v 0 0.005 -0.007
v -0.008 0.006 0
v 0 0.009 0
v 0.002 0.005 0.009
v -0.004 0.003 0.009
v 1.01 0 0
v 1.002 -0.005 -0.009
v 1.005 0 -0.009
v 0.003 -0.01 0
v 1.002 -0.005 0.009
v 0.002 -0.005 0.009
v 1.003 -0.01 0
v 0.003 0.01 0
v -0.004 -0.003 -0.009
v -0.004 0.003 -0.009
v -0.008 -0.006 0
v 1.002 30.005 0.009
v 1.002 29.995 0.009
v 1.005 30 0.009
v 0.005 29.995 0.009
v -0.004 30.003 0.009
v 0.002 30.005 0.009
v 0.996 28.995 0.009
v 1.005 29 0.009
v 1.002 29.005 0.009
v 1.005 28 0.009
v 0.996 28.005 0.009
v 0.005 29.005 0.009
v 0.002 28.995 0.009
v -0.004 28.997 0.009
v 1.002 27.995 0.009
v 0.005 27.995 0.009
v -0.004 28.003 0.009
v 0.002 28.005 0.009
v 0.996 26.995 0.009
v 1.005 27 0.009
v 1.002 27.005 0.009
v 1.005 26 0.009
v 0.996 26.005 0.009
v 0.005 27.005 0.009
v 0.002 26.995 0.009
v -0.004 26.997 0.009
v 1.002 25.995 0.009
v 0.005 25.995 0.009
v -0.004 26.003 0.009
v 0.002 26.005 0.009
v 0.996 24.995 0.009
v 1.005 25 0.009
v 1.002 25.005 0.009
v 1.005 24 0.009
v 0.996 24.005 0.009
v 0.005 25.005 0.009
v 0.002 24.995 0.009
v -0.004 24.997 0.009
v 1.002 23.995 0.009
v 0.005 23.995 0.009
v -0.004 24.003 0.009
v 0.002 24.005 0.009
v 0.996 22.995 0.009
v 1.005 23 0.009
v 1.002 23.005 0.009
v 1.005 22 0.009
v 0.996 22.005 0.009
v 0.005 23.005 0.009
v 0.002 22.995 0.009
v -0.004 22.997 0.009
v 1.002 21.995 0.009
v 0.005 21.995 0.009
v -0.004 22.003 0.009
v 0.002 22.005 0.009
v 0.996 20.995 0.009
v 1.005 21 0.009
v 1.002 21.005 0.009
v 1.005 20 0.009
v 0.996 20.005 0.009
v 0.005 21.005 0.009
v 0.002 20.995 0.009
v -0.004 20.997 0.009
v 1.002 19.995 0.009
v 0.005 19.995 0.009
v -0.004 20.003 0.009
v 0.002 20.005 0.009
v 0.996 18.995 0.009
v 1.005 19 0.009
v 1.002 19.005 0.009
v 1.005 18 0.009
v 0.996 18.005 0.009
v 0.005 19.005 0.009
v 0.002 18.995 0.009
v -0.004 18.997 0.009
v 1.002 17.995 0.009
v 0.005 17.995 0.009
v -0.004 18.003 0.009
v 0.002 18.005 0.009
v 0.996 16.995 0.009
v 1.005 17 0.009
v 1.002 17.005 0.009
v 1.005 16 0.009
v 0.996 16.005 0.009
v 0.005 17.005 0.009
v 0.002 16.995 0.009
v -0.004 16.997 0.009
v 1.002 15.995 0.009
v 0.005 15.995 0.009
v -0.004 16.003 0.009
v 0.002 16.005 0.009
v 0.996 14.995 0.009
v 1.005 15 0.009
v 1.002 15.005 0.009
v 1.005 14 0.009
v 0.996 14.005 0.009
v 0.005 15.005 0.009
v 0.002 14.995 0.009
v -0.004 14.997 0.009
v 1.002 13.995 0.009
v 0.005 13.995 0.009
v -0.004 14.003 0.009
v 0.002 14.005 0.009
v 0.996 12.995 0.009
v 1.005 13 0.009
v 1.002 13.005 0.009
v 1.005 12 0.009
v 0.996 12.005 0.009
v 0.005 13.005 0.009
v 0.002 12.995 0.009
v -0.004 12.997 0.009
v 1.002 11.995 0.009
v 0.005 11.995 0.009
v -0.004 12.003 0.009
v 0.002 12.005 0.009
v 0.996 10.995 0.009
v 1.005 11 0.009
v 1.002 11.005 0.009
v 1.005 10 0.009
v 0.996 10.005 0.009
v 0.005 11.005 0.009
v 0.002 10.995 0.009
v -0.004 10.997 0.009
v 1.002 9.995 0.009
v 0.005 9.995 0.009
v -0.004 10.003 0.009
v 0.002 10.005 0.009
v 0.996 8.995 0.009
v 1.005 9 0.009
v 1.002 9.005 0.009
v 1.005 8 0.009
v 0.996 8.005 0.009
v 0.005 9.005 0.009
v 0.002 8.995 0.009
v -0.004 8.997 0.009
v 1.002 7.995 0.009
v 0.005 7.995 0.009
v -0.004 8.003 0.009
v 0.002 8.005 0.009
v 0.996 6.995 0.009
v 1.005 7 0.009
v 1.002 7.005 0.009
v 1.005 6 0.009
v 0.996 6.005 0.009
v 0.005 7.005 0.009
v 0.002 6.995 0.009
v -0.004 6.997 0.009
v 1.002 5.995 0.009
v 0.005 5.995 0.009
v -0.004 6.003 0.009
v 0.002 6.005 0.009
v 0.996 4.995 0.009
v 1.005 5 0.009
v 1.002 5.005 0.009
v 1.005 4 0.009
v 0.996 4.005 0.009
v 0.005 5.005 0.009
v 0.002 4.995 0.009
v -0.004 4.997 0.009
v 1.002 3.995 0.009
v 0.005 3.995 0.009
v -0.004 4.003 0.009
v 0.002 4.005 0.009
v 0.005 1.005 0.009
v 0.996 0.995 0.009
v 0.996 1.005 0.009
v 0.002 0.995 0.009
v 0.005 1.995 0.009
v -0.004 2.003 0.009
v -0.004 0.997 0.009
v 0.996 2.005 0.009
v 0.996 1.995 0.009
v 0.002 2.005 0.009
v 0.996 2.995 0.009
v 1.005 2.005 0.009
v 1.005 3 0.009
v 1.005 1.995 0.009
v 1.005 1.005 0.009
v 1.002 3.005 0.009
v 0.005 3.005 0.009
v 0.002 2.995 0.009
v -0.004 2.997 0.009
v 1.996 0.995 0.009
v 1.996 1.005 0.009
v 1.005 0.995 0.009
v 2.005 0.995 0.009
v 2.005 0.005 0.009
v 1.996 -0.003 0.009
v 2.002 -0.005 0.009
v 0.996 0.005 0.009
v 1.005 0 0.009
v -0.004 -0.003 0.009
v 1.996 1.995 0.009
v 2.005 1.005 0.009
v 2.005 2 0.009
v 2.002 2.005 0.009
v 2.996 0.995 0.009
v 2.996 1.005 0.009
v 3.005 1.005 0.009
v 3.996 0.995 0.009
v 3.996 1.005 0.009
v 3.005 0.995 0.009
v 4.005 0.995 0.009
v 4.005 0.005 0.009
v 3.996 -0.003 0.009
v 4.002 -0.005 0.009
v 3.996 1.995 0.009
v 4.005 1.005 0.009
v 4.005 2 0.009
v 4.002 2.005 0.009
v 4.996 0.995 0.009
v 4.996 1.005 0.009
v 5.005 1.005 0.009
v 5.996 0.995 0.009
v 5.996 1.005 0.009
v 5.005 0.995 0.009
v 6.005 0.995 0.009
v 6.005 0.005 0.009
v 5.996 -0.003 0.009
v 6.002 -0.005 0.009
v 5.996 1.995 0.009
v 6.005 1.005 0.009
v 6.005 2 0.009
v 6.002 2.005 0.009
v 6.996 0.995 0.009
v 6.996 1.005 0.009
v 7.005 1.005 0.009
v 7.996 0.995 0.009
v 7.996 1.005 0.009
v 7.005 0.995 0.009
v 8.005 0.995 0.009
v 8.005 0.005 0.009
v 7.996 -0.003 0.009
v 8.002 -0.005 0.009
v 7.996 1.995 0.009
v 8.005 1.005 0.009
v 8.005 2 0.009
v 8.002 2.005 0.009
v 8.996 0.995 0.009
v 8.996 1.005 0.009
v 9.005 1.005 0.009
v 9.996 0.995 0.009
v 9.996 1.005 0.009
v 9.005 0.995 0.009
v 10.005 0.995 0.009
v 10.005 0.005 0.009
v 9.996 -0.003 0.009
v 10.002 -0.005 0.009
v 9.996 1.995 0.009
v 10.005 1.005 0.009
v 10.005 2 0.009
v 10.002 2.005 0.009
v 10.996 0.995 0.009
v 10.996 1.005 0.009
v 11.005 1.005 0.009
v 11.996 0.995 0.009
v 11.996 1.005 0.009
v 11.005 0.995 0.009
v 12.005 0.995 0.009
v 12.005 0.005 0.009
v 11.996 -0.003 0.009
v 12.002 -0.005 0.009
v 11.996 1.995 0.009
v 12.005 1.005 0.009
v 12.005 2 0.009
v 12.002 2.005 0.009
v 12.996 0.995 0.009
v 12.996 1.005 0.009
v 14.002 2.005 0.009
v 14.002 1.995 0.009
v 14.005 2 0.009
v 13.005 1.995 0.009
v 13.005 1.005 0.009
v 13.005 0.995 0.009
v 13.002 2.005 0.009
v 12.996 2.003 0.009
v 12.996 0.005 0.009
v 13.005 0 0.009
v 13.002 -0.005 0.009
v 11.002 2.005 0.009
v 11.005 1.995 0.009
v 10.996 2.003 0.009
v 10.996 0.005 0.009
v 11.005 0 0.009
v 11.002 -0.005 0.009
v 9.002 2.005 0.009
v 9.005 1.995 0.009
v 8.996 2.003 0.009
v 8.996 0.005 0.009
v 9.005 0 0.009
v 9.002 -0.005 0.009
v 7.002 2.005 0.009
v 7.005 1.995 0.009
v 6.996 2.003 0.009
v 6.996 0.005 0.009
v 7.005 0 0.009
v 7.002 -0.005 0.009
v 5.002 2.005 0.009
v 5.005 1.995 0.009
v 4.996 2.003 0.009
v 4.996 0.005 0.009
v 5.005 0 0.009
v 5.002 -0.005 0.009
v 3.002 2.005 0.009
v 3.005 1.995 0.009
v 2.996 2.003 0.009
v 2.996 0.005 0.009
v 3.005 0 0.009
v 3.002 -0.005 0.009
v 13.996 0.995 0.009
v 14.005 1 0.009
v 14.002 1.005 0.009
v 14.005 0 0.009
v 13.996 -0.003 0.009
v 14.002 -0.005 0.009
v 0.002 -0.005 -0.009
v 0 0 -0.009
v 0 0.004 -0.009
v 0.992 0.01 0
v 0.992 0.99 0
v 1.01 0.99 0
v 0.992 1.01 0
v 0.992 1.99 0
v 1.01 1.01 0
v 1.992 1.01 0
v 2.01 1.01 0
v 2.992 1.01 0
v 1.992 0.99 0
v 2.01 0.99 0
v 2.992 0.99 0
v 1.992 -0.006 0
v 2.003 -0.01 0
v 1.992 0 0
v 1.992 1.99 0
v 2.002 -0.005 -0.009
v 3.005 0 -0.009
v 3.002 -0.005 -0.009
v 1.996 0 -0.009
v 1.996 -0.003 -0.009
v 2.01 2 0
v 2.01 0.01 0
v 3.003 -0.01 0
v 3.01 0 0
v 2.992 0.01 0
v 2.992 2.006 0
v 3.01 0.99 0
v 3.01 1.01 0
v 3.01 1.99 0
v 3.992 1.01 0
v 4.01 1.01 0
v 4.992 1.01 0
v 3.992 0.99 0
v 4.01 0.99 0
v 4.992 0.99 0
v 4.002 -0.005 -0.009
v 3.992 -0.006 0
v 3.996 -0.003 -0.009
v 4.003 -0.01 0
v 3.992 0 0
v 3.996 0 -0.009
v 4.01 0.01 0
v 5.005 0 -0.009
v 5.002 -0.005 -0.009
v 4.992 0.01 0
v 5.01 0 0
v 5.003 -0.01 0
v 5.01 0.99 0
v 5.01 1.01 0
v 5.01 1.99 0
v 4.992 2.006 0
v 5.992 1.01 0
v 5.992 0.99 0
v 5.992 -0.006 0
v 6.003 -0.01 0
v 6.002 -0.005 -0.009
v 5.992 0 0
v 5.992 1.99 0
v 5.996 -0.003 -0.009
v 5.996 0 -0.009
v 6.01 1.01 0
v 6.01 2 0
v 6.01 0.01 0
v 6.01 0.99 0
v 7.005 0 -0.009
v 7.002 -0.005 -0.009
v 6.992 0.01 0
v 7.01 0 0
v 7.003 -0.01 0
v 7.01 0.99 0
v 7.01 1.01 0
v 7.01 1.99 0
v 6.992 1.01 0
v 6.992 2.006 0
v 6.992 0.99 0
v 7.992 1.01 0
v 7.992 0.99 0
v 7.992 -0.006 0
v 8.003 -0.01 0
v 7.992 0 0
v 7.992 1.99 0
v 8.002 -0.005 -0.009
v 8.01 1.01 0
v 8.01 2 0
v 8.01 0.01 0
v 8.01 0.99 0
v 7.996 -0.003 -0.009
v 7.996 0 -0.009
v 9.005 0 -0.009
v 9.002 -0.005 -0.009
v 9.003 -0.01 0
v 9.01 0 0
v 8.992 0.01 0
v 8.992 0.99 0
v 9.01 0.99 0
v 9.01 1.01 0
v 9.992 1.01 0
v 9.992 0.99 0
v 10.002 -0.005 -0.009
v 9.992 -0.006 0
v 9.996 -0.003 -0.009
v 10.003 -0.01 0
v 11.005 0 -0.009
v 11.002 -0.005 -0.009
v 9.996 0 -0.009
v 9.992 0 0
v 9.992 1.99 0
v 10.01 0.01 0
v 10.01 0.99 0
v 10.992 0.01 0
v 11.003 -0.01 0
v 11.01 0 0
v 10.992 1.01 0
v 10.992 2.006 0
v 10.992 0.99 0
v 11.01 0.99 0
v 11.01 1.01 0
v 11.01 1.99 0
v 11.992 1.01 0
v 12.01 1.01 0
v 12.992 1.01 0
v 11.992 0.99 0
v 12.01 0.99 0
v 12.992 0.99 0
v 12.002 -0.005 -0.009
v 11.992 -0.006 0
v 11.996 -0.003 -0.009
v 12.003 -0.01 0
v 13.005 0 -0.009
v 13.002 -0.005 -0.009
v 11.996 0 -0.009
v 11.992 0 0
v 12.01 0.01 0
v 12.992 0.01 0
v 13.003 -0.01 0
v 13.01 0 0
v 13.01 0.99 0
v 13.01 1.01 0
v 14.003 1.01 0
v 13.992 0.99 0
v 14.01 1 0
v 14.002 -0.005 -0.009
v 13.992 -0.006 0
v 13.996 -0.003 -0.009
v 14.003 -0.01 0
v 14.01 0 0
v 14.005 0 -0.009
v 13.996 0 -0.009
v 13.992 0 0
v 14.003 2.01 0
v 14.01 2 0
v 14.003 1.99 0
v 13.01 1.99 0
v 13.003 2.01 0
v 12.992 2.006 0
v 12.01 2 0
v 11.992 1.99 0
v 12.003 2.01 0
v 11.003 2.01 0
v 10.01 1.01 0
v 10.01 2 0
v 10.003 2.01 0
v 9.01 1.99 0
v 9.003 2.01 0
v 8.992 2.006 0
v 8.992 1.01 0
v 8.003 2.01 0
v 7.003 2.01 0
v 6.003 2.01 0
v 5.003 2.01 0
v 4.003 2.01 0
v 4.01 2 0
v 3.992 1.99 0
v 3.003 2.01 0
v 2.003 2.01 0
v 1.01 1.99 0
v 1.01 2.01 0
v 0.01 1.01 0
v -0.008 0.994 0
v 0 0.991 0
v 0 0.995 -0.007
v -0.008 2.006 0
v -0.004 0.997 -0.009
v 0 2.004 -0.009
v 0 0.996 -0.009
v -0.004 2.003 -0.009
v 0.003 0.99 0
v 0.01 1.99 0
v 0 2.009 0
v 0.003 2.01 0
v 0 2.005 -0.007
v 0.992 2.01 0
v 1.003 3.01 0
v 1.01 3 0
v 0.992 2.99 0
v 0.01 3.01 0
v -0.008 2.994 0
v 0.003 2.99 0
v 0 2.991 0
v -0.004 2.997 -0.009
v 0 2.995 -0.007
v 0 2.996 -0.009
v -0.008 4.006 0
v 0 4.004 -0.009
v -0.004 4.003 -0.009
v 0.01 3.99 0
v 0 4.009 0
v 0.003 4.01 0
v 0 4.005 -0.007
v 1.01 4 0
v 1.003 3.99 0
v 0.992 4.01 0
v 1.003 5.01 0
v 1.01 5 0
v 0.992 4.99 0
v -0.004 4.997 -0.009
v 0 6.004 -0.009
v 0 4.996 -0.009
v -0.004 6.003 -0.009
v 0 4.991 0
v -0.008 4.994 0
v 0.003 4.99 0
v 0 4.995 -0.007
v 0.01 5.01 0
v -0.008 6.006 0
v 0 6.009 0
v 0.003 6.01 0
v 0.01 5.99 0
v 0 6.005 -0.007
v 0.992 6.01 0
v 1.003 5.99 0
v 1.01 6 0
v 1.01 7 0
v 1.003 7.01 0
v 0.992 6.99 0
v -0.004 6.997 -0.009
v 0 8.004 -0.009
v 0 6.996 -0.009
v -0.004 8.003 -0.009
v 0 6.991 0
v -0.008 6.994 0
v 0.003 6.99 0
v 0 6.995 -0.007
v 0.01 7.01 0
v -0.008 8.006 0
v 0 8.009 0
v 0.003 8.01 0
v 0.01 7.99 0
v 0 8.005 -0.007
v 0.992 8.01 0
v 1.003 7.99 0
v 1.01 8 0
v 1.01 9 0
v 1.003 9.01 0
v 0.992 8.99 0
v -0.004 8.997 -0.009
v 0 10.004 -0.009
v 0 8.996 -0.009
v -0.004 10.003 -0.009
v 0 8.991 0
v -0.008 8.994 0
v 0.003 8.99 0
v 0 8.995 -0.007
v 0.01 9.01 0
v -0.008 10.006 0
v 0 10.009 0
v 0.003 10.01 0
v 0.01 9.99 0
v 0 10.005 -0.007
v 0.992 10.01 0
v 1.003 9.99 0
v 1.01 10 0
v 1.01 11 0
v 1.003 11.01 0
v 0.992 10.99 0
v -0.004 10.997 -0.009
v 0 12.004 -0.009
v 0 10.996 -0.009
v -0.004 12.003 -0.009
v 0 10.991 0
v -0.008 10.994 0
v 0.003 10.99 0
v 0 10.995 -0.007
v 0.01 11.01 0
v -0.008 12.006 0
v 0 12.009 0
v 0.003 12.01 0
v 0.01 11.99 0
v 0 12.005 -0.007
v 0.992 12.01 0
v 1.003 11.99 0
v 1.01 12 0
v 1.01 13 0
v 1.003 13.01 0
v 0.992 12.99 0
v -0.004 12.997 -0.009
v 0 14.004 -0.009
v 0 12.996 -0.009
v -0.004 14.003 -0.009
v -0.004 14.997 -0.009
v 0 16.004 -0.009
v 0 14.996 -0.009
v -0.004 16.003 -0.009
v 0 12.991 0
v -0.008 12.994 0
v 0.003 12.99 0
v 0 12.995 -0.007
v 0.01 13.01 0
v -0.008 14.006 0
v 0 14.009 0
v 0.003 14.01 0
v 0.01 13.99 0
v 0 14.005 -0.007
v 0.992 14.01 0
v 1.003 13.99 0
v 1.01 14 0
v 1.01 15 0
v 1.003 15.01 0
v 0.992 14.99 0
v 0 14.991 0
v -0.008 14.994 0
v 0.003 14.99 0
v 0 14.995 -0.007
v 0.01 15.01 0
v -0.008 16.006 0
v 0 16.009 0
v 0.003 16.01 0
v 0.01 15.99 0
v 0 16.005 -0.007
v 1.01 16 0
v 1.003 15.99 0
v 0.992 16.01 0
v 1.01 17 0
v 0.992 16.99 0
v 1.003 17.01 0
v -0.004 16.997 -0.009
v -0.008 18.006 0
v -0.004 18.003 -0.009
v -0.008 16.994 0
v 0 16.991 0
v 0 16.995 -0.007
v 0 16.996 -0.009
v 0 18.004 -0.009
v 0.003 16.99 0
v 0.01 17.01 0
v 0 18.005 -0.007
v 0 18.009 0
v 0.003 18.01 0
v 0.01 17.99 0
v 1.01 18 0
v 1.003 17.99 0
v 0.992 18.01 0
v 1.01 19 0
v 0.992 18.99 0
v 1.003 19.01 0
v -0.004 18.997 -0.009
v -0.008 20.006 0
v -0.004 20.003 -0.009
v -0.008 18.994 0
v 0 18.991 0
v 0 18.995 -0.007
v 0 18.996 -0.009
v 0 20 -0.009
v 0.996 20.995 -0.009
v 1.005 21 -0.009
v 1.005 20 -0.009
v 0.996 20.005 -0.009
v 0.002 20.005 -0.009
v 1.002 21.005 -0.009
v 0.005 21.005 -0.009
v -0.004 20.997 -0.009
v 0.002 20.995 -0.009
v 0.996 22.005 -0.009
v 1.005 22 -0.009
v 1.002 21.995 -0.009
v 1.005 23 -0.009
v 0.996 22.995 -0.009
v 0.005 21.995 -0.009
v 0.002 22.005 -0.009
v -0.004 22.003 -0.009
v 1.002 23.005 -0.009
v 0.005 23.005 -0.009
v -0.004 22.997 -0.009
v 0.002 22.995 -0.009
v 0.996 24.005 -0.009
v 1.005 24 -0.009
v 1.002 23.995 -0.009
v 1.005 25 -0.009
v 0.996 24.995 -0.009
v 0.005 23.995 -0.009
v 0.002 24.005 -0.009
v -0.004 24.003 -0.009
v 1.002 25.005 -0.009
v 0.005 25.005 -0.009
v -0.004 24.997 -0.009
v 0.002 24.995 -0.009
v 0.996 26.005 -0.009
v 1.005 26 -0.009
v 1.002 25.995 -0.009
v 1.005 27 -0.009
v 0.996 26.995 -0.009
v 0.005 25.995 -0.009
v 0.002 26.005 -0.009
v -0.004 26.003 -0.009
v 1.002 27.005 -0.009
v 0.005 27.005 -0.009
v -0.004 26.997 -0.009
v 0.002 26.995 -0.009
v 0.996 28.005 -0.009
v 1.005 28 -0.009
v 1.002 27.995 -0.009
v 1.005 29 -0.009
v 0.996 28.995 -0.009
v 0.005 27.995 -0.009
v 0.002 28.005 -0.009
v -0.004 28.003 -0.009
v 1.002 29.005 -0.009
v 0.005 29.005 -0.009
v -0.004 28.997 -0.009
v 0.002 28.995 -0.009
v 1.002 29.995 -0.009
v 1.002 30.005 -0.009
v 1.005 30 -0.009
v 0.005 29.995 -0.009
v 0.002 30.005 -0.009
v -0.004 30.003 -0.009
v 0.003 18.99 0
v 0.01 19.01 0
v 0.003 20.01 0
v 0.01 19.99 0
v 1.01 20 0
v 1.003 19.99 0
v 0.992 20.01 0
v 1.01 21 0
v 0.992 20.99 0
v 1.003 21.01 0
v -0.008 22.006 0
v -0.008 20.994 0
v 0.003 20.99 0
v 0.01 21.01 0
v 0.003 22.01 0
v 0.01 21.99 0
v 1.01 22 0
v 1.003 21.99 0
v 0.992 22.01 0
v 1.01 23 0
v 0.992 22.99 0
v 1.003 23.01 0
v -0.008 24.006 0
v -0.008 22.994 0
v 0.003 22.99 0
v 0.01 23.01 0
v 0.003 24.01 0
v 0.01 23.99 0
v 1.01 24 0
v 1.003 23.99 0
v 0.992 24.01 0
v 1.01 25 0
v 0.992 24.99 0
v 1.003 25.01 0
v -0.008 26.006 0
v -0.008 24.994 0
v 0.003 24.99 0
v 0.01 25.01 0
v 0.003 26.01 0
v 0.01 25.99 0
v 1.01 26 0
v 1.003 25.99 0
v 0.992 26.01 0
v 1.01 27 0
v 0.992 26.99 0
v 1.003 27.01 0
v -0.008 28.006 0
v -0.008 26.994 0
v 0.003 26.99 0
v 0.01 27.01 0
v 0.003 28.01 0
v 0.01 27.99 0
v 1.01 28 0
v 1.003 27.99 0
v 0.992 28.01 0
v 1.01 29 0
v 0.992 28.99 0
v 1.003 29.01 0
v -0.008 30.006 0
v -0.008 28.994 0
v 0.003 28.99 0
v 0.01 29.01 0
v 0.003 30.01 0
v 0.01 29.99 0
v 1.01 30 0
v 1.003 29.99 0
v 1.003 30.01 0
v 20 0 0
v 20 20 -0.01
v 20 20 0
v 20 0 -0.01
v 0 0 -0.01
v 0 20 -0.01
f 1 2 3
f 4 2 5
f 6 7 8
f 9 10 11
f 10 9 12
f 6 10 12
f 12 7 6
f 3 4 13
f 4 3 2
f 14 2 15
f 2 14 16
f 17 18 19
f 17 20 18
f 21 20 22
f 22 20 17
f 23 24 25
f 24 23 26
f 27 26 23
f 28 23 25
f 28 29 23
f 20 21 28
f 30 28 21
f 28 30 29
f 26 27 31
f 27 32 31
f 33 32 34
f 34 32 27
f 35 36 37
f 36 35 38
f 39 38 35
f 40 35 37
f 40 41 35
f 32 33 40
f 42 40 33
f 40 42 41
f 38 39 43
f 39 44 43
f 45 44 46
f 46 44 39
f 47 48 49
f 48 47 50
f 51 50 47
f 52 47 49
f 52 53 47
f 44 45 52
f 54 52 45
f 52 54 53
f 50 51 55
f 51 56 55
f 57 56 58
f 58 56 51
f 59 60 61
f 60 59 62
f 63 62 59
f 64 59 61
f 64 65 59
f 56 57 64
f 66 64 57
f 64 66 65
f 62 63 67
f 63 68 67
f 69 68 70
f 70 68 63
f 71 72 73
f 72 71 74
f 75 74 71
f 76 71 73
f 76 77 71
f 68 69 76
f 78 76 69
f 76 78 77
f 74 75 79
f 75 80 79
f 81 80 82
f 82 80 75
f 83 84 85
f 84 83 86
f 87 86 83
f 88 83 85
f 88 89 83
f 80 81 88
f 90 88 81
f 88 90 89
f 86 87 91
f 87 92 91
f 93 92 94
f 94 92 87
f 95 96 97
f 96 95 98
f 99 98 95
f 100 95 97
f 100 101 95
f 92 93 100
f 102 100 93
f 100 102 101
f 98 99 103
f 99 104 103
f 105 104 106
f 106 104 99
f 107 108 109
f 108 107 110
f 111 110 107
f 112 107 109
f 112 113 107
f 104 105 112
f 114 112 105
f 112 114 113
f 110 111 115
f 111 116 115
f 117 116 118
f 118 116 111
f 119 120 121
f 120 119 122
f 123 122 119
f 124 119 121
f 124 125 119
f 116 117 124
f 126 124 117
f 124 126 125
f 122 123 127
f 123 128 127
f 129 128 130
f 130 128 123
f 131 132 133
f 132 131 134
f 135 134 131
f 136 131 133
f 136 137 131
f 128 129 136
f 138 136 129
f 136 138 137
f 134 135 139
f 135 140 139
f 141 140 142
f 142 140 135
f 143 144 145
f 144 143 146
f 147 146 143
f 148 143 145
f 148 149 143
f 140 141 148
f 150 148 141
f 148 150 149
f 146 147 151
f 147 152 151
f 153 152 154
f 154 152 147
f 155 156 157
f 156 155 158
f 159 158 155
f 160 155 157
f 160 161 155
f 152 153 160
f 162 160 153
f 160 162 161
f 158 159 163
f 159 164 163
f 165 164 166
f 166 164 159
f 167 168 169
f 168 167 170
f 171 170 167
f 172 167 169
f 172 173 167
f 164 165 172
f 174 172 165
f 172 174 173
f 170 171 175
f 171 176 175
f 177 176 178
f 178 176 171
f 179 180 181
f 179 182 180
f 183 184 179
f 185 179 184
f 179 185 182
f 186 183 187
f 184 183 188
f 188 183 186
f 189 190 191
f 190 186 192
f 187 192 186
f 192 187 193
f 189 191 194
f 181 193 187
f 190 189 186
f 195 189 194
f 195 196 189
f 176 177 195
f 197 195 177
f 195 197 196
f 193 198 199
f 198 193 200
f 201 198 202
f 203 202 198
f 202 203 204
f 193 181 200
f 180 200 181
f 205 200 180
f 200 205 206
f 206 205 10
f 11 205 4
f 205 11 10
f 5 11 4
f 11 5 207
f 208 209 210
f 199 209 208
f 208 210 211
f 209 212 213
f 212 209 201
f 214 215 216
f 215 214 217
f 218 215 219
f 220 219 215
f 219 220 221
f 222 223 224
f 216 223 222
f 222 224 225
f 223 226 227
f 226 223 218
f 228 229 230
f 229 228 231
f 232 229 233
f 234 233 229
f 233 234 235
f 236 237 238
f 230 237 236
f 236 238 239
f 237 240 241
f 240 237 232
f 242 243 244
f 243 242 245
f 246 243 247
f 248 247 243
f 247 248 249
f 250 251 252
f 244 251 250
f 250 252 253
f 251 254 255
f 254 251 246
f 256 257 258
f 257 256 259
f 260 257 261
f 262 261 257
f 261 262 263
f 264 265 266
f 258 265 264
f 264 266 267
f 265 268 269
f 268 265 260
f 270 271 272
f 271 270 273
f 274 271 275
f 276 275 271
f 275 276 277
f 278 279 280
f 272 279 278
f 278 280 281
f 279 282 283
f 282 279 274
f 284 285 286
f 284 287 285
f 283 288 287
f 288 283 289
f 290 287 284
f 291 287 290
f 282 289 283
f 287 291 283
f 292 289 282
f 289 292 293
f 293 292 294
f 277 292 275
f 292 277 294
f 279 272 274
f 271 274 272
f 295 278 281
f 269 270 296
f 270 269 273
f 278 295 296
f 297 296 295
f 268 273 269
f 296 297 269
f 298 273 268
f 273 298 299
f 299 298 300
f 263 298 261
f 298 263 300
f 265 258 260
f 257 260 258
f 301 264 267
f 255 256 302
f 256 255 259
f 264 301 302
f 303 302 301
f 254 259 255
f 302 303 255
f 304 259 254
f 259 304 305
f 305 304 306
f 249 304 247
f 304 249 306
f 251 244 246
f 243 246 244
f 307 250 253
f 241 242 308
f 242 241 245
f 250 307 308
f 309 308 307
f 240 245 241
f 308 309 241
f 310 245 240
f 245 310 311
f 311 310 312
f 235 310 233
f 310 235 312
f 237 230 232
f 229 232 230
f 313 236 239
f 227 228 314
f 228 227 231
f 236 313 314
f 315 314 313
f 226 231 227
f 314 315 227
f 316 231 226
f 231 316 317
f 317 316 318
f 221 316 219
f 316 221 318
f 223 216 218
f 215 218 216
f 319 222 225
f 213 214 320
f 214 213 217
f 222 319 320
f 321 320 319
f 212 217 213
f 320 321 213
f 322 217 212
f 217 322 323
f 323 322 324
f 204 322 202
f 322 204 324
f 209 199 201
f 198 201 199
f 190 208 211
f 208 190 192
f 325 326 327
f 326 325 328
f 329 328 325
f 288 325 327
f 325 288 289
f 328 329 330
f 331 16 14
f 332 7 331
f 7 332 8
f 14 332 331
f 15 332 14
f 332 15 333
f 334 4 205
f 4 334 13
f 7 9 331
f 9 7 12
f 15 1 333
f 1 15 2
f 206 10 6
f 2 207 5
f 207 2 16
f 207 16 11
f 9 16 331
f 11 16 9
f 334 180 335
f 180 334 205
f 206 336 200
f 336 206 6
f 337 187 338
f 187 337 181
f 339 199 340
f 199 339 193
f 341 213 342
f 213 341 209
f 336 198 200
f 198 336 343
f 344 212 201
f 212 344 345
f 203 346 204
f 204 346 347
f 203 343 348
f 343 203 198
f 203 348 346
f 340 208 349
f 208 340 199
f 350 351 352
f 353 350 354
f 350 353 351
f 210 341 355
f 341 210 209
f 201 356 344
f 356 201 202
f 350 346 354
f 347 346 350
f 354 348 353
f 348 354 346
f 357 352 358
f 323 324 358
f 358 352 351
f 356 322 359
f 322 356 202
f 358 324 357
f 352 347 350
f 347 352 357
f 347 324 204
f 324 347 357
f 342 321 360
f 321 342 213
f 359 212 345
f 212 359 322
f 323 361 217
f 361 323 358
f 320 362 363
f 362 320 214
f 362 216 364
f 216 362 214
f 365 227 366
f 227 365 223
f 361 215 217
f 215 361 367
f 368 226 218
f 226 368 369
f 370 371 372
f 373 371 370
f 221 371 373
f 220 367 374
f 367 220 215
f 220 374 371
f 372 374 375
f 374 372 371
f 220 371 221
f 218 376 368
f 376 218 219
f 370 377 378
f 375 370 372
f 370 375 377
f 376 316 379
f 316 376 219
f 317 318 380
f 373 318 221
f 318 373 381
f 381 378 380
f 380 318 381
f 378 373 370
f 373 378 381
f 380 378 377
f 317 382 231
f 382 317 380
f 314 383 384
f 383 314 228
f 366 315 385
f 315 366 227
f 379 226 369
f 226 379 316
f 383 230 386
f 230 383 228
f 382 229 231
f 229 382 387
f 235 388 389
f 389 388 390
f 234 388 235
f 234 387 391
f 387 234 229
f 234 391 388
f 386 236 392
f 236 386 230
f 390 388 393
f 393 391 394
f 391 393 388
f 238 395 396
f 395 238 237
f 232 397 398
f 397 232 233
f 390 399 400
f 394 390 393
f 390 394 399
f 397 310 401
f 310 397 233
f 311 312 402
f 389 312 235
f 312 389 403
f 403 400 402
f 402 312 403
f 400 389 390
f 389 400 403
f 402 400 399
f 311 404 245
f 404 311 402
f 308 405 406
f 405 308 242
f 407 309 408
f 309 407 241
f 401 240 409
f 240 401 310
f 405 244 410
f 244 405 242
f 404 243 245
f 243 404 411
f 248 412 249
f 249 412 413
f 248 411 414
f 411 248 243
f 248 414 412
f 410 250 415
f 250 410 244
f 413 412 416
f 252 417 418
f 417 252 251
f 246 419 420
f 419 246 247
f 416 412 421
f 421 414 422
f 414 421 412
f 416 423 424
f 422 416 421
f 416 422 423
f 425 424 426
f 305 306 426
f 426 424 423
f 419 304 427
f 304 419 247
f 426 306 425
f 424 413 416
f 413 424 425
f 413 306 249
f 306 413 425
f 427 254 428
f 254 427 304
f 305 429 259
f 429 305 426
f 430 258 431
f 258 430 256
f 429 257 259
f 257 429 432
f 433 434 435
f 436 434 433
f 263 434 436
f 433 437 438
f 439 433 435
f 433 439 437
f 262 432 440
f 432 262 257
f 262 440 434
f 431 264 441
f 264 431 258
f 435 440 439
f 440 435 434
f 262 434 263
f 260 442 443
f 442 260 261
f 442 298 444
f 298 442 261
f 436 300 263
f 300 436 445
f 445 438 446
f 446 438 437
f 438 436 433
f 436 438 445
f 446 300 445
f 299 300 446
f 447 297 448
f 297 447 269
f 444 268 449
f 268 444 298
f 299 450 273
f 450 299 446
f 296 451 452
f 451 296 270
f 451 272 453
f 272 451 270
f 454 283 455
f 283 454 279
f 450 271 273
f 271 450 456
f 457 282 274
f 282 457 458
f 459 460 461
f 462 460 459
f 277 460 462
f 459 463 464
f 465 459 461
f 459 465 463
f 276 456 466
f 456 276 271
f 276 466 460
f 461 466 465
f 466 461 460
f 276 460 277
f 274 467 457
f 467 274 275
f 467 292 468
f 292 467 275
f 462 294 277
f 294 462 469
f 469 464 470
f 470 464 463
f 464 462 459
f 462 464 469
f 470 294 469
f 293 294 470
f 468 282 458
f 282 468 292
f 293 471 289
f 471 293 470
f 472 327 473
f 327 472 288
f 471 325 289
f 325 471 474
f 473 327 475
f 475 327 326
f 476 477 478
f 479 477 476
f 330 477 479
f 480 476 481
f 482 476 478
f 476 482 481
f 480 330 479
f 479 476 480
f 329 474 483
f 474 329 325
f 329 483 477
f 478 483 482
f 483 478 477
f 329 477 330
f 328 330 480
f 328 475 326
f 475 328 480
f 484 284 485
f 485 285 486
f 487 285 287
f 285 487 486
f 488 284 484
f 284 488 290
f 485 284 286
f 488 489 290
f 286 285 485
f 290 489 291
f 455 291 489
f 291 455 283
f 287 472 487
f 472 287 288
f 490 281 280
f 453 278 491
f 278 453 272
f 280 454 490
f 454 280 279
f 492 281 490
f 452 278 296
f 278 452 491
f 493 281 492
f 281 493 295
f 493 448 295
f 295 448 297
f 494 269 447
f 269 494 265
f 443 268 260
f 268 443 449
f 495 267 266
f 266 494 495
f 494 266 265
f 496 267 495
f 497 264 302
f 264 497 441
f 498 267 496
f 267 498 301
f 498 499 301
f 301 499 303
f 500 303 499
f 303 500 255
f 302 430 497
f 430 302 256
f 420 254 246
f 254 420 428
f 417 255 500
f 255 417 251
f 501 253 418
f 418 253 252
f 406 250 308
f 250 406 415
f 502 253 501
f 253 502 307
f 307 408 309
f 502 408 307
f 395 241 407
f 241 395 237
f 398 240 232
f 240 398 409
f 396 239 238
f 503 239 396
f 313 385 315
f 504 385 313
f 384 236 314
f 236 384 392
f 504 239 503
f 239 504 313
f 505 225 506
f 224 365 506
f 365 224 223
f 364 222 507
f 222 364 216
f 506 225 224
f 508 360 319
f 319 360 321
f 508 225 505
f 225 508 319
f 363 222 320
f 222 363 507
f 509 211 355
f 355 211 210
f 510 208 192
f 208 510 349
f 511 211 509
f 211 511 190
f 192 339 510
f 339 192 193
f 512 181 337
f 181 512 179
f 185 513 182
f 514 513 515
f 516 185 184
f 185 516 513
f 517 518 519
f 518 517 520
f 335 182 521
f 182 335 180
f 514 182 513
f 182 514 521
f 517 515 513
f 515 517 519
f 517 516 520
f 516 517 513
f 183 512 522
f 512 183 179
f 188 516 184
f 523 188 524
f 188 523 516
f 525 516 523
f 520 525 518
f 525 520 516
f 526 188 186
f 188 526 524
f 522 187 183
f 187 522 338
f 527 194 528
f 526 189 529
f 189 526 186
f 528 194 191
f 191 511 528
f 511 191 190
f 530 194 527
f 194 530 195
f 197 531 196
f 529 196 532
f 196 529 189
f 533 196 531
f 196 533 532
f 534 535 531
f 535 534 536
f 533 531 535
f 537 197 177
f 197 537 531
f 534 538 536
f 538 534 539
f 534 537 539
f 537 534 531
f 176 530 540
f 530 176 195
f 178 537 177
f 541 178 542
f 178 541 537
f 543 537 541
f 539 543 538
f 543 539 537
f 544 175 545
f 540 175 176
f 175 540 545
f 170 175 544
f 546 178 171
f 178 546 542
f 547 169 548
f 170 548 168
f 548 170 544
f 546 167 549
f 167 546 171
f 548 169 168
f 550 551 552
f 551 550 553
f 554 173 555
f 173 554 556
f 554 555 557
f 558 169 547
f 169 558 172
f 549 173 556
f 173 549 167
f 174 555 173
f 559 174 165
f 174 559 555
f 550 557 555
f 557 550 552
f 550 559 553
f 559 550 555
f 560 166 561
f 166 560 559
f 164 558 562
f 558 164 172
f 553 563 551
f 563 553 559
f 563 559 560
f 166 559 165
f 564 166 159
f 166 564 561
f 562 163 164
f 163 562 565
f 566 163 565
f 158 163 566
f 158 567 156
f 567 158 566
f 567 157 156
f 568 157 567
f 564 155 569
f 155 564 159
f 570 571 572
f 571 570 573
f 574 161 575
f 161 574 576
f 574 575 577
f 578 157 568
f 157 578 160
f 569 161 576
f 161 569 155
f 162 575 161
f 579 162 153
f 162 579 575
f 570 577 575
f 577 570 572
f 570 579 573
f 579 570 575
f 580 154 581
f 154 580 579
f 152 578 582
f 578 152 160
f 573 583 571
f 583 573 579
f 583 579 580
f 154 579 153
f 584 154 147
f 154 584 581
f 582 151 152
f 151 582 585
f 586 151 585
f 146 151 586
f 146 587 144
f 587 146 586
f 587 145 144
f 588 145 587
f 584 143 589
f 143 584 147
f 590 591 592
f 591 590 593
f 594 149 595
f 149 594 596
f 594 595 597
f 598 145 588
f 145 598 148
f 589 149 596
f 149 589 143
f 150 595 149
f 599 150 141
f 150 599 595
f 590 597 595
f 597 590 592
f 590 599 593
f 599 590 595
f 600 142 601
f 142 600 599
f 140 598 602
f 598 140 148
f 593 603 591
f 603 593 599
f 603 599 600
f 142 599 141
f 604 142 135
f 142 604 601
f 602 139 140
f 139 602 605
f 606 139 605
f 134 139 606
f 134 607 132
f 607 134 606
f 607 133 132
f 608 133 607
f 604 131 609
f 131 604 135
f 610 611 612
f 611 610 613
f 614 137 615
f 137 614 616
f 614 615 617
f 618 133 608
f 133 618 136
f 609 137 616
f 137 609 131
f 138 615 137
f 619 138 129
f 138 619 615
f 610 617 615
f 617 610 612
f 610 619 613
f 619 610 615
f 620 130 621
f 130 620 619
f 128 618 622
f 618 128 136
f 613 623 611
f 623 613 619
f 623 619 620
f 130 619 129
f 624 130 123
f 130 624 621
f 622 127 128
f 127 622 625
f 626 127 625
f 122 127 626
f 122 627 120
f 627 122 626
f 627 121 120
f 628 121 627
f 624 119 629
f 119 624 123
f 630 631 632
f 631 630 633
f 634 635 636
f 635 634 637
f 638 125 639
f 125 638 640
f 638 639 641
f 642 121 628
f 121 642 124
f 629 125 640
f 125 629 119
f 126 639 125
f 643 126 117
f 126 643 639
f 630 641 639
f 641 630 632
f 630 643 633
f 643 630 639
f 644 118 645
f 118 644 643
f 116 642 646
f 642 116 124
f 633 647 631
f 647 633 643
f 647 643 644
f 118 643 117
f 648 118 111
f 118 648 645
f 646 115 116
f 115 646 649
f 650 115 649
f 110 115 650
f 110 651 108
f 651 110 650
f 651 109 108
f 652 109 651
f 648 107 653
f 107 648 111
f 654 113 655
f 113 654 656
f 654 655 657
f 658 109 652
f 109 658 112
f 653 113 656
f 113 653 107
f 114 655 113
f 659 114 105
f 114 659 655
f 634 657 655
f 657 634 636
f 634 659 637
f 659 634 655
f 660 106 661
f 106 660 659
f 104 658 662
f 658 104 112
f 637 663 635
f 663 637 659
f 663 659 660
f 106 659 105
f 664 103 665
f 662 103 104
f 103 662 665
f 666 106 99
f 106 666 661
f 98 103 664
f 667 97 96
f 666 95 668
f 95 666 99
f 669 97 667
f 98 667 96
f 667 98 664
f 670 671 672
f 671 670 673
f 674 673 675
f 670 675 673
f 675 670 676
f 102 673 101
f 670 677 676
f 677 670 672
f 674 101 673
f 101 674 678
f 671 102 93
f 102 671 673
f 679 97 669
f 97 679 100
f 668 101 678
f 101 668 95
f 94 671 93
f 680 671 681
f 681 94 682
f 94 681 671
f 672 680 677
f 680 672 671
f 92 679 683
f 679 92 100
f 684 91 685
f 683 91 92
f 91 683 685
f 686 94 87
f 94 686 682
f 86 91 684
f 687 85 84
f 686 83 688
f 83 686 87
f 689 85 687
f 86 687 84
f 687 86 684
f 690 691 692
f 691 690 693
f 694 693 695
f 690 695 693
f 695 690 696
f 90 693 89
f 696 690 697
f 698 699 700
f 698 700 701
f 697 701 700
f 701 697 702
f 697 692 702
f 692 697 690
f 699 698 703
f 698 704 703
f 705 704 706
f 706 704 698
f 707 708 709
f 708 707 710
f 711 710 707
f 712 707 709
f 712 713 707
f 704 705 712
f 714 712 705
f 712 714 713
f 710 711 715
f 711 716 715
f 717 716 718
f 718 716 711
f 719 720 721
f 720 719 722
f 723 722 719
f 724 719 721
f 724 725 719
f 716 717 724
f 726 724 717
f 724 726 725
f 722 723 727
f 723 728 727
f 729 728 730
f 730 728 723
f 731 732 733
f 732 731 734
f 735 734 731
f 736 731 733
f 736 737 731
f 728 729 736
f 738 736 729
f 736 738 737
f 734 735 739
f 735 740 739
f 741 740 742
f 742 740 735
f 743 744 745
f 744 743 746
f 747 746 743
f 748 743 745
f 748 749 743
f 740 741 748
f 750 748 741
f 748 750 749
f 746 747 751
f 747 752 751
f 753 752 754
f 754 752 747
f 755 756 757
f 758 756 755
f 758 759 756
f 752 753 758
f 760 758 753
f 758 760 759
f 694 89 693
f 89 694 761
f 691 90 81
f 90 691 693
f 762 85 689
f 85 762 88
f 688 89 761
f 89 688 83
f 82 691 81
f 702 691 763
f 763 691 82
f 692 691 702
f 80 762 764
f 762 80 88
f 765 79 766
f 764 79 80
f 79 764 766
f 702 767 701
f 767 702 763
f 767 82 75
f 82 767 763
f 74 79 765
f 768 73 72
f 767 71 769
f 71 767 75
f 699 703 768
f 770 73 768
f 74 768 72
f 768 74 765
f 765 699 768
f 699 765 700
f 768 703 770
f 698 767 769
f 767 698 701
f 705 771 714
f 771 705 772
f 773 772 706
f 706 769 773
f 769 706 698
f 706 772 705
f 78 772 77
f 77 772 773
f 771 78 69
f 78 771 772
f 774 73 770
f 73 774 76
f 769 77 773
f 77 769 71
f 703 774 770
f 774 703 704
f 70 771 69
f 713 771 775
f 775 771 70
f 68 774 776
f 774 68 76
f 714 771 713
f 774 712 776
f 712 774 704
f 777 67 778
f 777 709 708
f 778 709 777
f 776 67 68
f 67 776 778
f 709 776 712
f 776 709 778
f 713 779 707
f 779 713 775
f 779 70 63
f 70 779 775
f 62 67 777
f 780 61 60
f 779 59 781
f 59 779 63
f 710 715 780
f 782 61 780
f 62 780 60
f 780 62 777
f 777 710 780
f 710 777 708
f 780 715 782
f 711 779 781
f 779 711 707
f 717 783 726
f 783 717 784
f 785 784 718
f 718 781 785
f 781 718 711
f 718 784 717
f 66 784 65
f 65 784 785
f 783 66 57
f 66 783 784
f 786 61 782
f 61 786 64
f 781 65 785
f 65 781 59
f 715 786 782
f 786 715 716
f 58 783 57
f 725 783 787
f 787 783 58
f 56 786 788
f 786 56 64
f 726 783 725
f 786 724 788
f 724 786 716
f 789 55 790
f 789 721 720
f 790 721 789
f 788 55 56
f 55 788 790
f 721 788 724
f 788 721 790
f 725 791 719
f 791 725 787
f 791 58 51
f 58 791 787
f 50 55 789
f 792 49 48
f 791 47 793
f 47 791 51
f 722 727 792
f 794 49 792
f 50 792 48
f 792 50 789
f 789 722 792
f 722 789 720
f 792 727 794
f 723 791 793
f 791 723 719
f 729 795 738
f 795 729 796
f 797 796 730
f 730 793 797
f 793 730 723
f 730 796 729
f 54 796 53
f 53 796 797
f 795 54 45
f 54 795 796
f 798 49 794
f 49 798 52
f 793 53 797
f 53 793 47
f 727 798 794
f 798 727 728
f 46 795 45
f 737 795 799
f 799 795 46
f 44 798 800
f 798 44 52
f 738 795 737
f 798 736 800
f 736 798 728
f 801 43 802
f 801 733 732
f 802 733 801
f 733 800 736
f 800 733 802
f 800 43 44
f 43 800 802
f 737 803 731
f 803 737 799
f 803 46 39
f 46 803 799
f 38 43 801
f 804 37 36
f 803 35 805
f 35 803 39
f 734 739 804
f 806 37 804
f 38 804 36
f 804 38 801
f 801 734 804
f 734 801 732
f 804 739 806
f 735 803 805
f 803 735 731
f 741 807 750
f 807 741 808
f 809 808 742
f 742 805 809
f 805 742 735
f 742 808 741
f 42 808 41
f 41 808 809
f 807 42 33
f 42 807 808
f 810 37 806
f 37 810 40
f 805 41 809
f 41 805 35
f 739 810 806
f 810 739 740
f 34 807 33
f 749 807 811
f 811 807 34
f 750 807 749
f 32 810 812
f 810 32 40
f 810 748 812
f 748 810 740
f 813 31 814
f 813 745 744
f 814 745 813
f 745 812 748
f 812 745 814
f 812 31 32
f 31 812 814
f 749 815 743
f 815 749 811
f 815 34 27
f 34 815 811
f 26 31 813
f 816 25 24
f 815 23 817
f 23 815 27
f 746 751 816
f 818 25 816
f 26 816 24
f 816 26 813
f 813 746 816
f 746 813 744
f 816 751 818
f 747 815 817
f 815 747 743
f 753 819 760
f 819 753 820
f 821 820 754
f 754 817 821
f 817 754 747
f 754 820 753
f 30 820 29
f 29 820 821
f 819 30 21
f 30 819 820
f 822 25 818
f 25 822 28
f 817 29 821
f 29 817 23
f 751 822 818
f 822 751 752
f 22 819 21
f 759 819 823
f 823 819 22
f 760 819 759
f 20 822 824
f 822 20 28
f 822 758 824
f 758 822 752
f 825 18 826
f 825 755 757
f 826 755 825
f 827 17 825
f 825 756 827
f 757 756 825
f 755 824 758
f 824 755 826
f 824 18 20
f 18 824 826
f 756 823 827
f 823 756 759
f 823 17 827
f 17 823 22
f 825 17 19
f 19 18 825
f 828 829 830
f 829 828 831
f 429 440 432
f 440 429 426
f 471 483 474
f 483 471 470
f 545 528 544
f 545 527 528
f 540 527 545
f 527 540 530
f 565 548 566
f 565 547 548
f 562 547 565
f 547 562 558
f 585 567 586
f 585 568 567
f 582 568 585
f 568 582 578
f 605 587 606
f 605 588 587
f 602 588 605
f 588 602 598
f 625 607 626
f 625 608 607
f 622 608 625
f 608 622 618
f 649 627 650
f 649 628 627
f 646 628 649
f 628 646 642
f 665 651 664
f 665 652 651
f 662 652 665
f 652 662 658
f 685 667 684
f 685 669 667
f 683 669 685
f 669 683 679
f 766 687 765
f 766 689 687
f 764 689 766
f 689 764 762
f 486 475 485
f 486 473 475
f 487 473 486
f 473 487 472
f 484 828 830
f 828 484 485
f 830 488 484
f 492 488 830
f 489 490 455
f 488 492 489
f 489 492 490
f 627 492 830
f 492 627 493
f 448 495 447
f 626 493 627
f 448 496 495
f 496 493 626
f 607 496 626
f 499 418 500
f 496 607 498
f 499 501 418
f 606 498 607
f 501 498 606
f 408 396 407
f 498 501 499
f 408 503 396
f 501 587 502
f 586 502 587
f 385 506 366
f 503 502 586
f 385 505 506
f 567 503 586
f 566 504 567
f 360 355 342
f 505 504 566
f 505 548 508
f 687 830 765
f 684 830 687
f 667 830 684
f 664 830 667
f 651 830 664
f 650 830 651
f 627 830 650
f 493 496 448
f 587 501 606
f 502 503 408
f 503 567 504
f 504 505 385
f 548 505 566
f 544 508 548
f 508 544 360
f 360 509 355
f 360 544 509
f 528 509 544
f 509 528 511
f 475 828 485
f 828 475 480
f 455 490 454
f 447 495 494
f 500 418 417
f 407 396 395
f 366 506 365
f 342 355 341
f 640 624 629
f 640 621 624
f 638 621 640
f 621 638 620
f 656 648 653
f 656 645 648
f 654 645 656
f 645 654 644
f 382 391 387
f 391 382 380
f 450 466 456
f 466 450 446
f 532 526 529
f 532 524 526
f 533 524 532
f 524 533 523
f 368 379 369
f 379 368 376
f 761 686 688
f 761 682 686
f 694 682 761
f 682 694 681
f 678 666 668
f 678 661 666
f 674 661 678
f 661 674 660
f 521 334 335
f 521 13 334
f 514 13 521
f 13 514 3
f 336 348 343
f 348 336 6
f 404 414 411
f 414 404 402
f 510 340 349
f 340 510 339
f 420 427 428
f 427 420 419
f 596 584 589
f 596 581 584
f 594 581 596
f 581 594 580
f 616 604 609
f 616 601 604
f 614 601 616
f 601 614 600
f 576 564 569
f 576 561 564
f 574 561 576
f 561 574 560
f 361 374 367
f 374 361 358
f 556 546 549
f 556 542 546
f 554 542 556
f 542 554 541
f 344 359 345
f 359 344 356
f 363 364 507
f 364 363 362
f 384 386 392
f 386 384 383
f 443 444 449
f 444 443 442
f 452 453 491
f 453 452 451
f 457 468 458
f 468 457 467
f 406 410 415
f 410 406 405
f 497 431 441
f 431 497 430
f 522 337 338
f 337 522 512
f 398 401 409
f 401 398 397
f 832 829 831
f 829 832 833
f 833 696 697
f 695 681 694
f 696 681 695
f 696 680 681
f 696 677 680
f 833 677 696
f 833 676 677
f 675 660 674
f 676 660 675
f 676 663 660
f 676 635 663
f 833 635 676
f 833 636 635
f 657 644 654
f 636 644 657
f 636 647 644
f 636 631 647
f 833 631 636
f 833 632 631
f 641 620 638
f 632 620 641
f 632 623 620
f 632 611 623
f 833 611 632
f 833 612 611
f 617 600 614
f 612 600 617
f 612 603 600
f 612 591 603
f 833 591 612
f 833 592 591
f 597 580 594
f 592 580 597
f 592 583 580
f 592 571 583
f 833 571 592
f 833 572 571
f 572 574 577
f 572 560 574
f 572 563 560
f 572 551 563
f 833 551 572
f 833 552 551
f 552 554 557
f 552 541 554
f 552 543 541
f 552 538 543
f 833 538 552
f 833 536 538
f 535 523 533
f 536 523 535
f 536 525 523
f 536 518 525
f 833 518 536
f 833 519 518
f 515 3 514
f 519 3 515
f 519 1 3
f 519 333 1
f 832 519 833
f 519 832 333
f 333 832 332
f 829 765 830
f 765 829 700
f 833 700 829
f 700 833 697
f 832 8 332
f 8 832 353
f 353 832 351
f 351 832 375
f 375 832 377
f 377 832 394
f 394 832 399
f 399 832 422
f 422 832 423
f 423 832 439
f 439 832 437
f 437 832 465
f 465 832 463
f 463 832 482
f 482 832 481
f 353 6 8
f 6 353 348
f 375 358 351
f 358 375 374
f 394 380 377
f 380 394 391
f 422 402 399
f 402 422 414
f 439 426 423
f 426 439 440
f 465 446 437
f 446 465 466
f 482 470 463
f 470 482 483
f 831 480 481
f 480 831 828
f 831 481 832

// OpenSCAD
hull(){
    translate([0, 0]) sphere(0.01);
    translate([1, 0]) sphere(0.01);
}
hull(){
    translate([1, 0]) sphere(0.01);
    translate([1, 1]) sphere(0.01);
}
hull(){
    translate([1, 1]) sphere(0.01);
    translate([2, 1]) sphere(0.01);
}
hull(){
    translate([2, 1]) sphere(0.01);
    translate([2, 0]) sphere(0.01);
}
hull(){
    translate([2, 0]) sphere(0.01);
    translate([3, 0]) sphere(0.01);
}
hull(){
    translate([3, 0]) sphere(0.01);
    translate([3, 1]) sphere(0.01);
}
hull(){
    translate([3, 1]) sphere(0.01);
    translate([4, 1]) sphere(0.01);
}
hull(){
    translate([4, 1]) sphere(0.01);
    translate([4, 0]) sphere(0.01);
}
hull(){
    translate([4, 0]) sphere(0.01);
    translate([5, 0]) sphere(0.01);
}
hull(){
    translate([5, 0]) sphere(0.01);
    translate([5, 1]) sphere(0.01);
}
hull(){
    translate([5, 1]) sphere(0.01);
    translate([6, 1]) sphere(0.01);
}
hull(){
    translate([6, 1]) sphere(0.01);
    translate([6, 0]) sphere(0.01);
}
hull(){
    translate([6, 0]) sphere(0.01);
    translate([7, 0]) sphere(0.01);
}
hull(){
    translate([7, 0]) sphere(0.01);
    translate([7, 1]) sphere(0.01);
}
hull(){
    translate([7, 1]) sphere(0.01);
    translate([8, 1]) sphere(0.01);
}
hull(){
    translate([8, 1]) sphere(0.01);
    translate([8, 0]) sphere(0.01);
}
hull(){
    translate([8, 0]) sphere(0.01);
    translate([9, 0]) sphere(0.01);
}
hull(){
    translate([9, 0]) sphere(0.01);
    translate([9, 1]) sphere(0.01);
}
hull(){
    translate([9, 1]) sphere(0.01);
    translate([10, 1]) sphere(0.01);
}
hull(){
    translate([10, 1]) sphere(0.01);
    translate([10, 0]) sphere(0.01);
}
hull(){
    translate([10, 0]) sphere(0.01);
    translate([11, 0]) sphere(0.01);
}
hull(){
    translate([11, 0]) sphere(0.01);
    translate([11, 1]) sphere(0.01);
}
hull(){
    translate([11, 1]) sphere(0.01);
    translate([12, 1]) sphere(0.01);
}
hull(){
    translate([12, 1]) sphere(0.01);
    translate([12, 0]) sphere(0.01);
}
hull(){
    translate([12, 0]) sphere(0.01);
    translate([13, 0]) sphere(0.01);
}
hull(){
    translate([13, 0]) sphere(0.01);
    translate([13, 1]) sphere(0.01);
}
hull(){
    translate([13, 1]) sphere(0.01);
    translate([14, 1]) sphere(0.01);
}
hull(){
    translate([14, 1]) sphere(0.01);
    translate([14, 0]) sphere(0.01);
}
hull(){
    translate([14, 2]) sphere(0.01);
    translate([13, 2]) sphere(0.01);
}
hull(){
    translate([13, 2]) sphere(0.01);
    translate([13, 1]) sphere(0.01);
}
hull(){
    translate([13, 1]) sphere(0.01);
    translate([12, 1]) sphere(0.01);
}
hull(){
    translate([12, 1]) sphere(0.01);
    translate([12, 2]) sphere(0.01);
}
hull(){
    translate([12, 2]) sphere(0.01);
    translate([11, 2]) sphere(0.01);
}
hull(){
    translate([11, 2]) sphere(0.01);
    translate([11, 1]) sphere(0.01);
}
hull(){
    translate([11, 1]) sphere(0.01);
    translate([10, 1]) sphere(0.01);
}
hull(){
    translate([10, 1]) sphere(0.01);
    translate([10, 2]) sphere(0.01);
}
hull(){
    translate([10, 2]) sphere(0.01);
    translate([9, 2]) sphere(0.01);
}
hull(){
    translate([9, 2]) sphere(0.01);
    translate([9, 1]) sphere(0.01);
}
hull(){
    translate([9, 1]) sphere(0.01);
    translate([8, 1]) sphere(0.01);
}
hull(){
    translate([8, 1]) sphere(0.01);
    translate([8, 2]) sphere(0.01);
}
hull(){
    translate([8, 2]) sphere(0.01);
    translate([7, 2]) sphere(0.01);
}
hull(){
    translate([7, 2]) sphere(0.01);
    translate([7, 1]) sphere(0.01);
}
hull(){
    translate([7, 1]) sphere(0.01);
    translate([6, 1]) sphere(0.01);
}
hull(){
    translate([6, 1]) sphere(0.01);
    translate([6, 2]) sphere(0.01);
}
hull(){
    translate([6, 2]) sphere(0.01);
    translate([5, 2]) sphere(0.01);
}
hull(){
    translate([5, 2]) sphere(0.01);
    translate([5, 1]) sphere(0.01);
}
hull(){
    translate([5, 1]) sphere(0.01);
    translate([4, 1]) sphere(0.01);
}
hull(){
    translate([4, 1]) sphere(0.01);
    translate([4, 2]) sphere(0.01);
}
hull(){
    translate([4, 2]) sphere(0.01);
    translate([3, 2]) sphere(0.01);
}
hull(){
    translate([3, 2]) sphere(0.01);
    translate([3, 1]) sphere(0.01);
}
hull(){
    translate([3, 1]) sphere(0.01);
    translate([2, 1]) sphere(0.01);
}
hull(){
    translate([2, 1]) sphere(0.01);
    translate([2, 2]) sphere(0.01);
}
hull(){
    translate([2, 2]) sphere(0.01);
    translate([1, 2]) sphere(0.01);
}
hull(){
    translate([1, 2]) sphere(0.01);
    translate([1, 1]) sphere(0.01);
}
hull(){
    translate([1, 1]) sphere(0.01);
    translate([0, 1]) sphere(0.01);
}
hull(){
    translate([0, 1]) sphere(0.01);
    translate([0, 2]) sphere(0.01);
}
hull(){
    translate([0, 2]) sphere(0.01);
    translate([1, 2]) sphere(0.01);
}
hull(){
    translate([1, 2]) sphere(0.01);
    translate([1, 3]) sphere(0.01);
}
hull(){
    translate([1, 3]) sphere(0.01);
    translate([0, 3]) sphere(0.01);
}
hull(){
    translate([0, 3]) sphere(0.01);
    translate([0, 4]) sphere(0.01);
}
hull(){
    translate([0, 4]) sphere(0.01);
    translate([1, 4]) sphere(0.01);
}
hull(){
    translate([1, 4]) sphere(0.01);
    translate([1, 5]) sphere(0.01);
}
hull(){
    translate([1, 5]) sphere(0.01);
    translate([0, 5]) sphere(0.01);
}
hull(){
    translate([0, 5]) sphere(0.01);
    translate([0, 6]) sphere(0.01);
}
hull(){
    translate([0, 6]) sphere(0.01);
    translate([1, 6]) sphere(0.01);
}
hull(){
    translate([1, 6]) sphere(0.01);
    translate([1, 7]) sphere(0.01);
}
hull(){
    translate([1, 7]) sphere(0.01);
    translate([0, 7]) sphere(0.01);
}
hull(){
    translate([0, 7]) sphere(0.01);
    translate([0, 8]) sphere(0.01);
}
hull(){
    translate([0, 8]) sphere(0.01);
    translate([1, 8]) sphere(0.01);
}
hull(){
    translate([1, 8]) sphere(0.01);
    translate([1, 9]) sphere(0.01);
}
hull(){
    translate([1, 9]) sphere(0.01);
    translate([0, 9]) sphere(0.01);
}
hull(){
    translate([0, 9]) sphere(0.01);
    translate([0, 10]) sphere(0.01);
}
hull(){
    translate([0, 10]) sphere(0.01);
    translate([1, 10]) sphere(0.01);
}
hull(){
    translate([1, 10]) sphere(0.01);
    translate([1, 11]) sphere(0.01);
}
hull(){
    translate([1, 11]) sphere(0.01);
    translate([0, 11]) sphere(0.01);
}
hull(){
    translate([0, 11]) sphere(0.01);
    translate([0, 12]) sphere(0.01);
}
hull(){
    translate([0, 12]) sphere(0.01);
    translate([1, 12]) sphere(0.01);
}
hull(){
    translate([1, 12]) sphere(0.01);
    translate([1, 13]) sphere(0.01);
}
hull(){
    translate([1, 13]) sphere(0.01);
    translate([0, 13]) sphere(0.01);
}
hull(){
    translate([0, 13]) sphere(0.01);
    translate([0, 14]) sphere(0.01);
}
hull(){
    translate([0, 14]) sphere(0.01);
    translate([1, 14]) sphere(0.01);
}
hull(){
    translate([1, 14]) sphere(0.01);
    translate([1, 15]) sphere(0.01);
}
hull(){
    translate([1, 15]) sphere(0.01);
    translate([0, 15]) sphere(0.01);
}
hull(){
    translate([0, 15]) sphere(0.01);
    translate([0, 16]) sphere(0.01);
}
hull(){
    translate([0, 16]) sphere(0.01);
    translate([1, 16]) sphere(0.01);
}
hull(){
    translate([1, 16]) sphere(0.01);
    translate([1, 17]) sphere(0.01);
}
hull(){
    translate([1, 17]) sphere(0.01);
    translate([0, 17]) sphere(0.01);
}
hull(){
    translate([0, 17]) sphere(0.01);
    translate([0, 18]) sphere(0.01);
}
hull(){
    translate([0, 18]) sphere(0.01);
    translate([1, 18]) sphere(0.01);
}
hull(){
    translate([1, 18]) sphere(0.01);
    translate([1, 19]) sphere(0.01);
}
hull(){
    translate([1, 19]) sphere(0.01);
    translate([0, 19]) sphere(0.01);
}
hull(){
    translate([0, 19]) sphere(0.01);
    translate([0, 20]) sphere(0.01);
}
hull(){
    translate([0, 20]) sphere(0.01);
    translate([1, 20]) sphere(0.01);
}
hull(){
    translate([1, 20]) sphere(0.01);
    translate([1, 21]) sphere(0.01);
}
hull(){
    translate([1, 21]) sphere(0.01);
    translate([0, 21]) sphere(0.01);
}
hull(){
    translate([0, 21]) sphere(0.01);
    translate([0, 22]) sphere(0.01);
}
hull(){
    translate([0, 22]) sphere(0.01);
    translate([1, 22]) sphere(0.01);
}
hull(){
    translate([1, 22]) sphere(0.01);
    translate([1, 23]) sphere(0.01);
}
hull(){
    translate([1, 23]) sphere(0.01);
    translate([0, 23]) sphere(0.01);
}
hull(){
    translate([0, 23]) sphere(0.01);
    translate([0, 24]) sphere(0.01);
}
hull(){
    translate([0, 24]) sphere(0.01);
    translate([1, 24]) sphere(0.01);
}
hull(){
    translate([1, 24]) sphere(0.01);
    translate([1, 25]) sphere(0.01);
}
hull(){
    translate([1, 25]) sphere(0.01);
    translate([0, 25]) sphere(0.01);
}
hull(){
    translate([0, 25]) sphere(0.01);
    translate([0, 26]) sphere(0.01);
}
hull(){
    translate([0, 26]) sphere(0.01);
    translate([1, 26]) sphere(0.01);
}
hull(){
    translate([1, 26]) sphere(0.01);
    translate([1, 27]) sphere(0.01);
}
hull(){
    translate([1, 27]) sphere(0.01);
    translate([0, 27]) sphere(0.01);
}
hull(){
    translate([0, 27]) sphere(0.01);
    translate([0, 28]) sphere(0.01);
}
hull(){
    translate([0, 28]) sphere(0.01);
    translate([1, 28]) sphere(0.01);
}
hull(){
    translate([1, 28]) sphere(0.01);
    translate([1, 29]) sphere(0.01);
}
hull(){
    translate([1, 29]) sphere(0.01);
    translate([0, 29]) sphere(0.01);
}
hull(){
    translate([0, 29]) sphere(0.01);
    translate([0, 30]) sphere(0.01);
}
hull(){
    translate([0, 30]) sphere(0.01);
    translate([1, 30]) sphere(0.01);
}
translate([0,0,-0.01]) color([0.1,0.1,0.1]) cube([20,20,0.01]);
